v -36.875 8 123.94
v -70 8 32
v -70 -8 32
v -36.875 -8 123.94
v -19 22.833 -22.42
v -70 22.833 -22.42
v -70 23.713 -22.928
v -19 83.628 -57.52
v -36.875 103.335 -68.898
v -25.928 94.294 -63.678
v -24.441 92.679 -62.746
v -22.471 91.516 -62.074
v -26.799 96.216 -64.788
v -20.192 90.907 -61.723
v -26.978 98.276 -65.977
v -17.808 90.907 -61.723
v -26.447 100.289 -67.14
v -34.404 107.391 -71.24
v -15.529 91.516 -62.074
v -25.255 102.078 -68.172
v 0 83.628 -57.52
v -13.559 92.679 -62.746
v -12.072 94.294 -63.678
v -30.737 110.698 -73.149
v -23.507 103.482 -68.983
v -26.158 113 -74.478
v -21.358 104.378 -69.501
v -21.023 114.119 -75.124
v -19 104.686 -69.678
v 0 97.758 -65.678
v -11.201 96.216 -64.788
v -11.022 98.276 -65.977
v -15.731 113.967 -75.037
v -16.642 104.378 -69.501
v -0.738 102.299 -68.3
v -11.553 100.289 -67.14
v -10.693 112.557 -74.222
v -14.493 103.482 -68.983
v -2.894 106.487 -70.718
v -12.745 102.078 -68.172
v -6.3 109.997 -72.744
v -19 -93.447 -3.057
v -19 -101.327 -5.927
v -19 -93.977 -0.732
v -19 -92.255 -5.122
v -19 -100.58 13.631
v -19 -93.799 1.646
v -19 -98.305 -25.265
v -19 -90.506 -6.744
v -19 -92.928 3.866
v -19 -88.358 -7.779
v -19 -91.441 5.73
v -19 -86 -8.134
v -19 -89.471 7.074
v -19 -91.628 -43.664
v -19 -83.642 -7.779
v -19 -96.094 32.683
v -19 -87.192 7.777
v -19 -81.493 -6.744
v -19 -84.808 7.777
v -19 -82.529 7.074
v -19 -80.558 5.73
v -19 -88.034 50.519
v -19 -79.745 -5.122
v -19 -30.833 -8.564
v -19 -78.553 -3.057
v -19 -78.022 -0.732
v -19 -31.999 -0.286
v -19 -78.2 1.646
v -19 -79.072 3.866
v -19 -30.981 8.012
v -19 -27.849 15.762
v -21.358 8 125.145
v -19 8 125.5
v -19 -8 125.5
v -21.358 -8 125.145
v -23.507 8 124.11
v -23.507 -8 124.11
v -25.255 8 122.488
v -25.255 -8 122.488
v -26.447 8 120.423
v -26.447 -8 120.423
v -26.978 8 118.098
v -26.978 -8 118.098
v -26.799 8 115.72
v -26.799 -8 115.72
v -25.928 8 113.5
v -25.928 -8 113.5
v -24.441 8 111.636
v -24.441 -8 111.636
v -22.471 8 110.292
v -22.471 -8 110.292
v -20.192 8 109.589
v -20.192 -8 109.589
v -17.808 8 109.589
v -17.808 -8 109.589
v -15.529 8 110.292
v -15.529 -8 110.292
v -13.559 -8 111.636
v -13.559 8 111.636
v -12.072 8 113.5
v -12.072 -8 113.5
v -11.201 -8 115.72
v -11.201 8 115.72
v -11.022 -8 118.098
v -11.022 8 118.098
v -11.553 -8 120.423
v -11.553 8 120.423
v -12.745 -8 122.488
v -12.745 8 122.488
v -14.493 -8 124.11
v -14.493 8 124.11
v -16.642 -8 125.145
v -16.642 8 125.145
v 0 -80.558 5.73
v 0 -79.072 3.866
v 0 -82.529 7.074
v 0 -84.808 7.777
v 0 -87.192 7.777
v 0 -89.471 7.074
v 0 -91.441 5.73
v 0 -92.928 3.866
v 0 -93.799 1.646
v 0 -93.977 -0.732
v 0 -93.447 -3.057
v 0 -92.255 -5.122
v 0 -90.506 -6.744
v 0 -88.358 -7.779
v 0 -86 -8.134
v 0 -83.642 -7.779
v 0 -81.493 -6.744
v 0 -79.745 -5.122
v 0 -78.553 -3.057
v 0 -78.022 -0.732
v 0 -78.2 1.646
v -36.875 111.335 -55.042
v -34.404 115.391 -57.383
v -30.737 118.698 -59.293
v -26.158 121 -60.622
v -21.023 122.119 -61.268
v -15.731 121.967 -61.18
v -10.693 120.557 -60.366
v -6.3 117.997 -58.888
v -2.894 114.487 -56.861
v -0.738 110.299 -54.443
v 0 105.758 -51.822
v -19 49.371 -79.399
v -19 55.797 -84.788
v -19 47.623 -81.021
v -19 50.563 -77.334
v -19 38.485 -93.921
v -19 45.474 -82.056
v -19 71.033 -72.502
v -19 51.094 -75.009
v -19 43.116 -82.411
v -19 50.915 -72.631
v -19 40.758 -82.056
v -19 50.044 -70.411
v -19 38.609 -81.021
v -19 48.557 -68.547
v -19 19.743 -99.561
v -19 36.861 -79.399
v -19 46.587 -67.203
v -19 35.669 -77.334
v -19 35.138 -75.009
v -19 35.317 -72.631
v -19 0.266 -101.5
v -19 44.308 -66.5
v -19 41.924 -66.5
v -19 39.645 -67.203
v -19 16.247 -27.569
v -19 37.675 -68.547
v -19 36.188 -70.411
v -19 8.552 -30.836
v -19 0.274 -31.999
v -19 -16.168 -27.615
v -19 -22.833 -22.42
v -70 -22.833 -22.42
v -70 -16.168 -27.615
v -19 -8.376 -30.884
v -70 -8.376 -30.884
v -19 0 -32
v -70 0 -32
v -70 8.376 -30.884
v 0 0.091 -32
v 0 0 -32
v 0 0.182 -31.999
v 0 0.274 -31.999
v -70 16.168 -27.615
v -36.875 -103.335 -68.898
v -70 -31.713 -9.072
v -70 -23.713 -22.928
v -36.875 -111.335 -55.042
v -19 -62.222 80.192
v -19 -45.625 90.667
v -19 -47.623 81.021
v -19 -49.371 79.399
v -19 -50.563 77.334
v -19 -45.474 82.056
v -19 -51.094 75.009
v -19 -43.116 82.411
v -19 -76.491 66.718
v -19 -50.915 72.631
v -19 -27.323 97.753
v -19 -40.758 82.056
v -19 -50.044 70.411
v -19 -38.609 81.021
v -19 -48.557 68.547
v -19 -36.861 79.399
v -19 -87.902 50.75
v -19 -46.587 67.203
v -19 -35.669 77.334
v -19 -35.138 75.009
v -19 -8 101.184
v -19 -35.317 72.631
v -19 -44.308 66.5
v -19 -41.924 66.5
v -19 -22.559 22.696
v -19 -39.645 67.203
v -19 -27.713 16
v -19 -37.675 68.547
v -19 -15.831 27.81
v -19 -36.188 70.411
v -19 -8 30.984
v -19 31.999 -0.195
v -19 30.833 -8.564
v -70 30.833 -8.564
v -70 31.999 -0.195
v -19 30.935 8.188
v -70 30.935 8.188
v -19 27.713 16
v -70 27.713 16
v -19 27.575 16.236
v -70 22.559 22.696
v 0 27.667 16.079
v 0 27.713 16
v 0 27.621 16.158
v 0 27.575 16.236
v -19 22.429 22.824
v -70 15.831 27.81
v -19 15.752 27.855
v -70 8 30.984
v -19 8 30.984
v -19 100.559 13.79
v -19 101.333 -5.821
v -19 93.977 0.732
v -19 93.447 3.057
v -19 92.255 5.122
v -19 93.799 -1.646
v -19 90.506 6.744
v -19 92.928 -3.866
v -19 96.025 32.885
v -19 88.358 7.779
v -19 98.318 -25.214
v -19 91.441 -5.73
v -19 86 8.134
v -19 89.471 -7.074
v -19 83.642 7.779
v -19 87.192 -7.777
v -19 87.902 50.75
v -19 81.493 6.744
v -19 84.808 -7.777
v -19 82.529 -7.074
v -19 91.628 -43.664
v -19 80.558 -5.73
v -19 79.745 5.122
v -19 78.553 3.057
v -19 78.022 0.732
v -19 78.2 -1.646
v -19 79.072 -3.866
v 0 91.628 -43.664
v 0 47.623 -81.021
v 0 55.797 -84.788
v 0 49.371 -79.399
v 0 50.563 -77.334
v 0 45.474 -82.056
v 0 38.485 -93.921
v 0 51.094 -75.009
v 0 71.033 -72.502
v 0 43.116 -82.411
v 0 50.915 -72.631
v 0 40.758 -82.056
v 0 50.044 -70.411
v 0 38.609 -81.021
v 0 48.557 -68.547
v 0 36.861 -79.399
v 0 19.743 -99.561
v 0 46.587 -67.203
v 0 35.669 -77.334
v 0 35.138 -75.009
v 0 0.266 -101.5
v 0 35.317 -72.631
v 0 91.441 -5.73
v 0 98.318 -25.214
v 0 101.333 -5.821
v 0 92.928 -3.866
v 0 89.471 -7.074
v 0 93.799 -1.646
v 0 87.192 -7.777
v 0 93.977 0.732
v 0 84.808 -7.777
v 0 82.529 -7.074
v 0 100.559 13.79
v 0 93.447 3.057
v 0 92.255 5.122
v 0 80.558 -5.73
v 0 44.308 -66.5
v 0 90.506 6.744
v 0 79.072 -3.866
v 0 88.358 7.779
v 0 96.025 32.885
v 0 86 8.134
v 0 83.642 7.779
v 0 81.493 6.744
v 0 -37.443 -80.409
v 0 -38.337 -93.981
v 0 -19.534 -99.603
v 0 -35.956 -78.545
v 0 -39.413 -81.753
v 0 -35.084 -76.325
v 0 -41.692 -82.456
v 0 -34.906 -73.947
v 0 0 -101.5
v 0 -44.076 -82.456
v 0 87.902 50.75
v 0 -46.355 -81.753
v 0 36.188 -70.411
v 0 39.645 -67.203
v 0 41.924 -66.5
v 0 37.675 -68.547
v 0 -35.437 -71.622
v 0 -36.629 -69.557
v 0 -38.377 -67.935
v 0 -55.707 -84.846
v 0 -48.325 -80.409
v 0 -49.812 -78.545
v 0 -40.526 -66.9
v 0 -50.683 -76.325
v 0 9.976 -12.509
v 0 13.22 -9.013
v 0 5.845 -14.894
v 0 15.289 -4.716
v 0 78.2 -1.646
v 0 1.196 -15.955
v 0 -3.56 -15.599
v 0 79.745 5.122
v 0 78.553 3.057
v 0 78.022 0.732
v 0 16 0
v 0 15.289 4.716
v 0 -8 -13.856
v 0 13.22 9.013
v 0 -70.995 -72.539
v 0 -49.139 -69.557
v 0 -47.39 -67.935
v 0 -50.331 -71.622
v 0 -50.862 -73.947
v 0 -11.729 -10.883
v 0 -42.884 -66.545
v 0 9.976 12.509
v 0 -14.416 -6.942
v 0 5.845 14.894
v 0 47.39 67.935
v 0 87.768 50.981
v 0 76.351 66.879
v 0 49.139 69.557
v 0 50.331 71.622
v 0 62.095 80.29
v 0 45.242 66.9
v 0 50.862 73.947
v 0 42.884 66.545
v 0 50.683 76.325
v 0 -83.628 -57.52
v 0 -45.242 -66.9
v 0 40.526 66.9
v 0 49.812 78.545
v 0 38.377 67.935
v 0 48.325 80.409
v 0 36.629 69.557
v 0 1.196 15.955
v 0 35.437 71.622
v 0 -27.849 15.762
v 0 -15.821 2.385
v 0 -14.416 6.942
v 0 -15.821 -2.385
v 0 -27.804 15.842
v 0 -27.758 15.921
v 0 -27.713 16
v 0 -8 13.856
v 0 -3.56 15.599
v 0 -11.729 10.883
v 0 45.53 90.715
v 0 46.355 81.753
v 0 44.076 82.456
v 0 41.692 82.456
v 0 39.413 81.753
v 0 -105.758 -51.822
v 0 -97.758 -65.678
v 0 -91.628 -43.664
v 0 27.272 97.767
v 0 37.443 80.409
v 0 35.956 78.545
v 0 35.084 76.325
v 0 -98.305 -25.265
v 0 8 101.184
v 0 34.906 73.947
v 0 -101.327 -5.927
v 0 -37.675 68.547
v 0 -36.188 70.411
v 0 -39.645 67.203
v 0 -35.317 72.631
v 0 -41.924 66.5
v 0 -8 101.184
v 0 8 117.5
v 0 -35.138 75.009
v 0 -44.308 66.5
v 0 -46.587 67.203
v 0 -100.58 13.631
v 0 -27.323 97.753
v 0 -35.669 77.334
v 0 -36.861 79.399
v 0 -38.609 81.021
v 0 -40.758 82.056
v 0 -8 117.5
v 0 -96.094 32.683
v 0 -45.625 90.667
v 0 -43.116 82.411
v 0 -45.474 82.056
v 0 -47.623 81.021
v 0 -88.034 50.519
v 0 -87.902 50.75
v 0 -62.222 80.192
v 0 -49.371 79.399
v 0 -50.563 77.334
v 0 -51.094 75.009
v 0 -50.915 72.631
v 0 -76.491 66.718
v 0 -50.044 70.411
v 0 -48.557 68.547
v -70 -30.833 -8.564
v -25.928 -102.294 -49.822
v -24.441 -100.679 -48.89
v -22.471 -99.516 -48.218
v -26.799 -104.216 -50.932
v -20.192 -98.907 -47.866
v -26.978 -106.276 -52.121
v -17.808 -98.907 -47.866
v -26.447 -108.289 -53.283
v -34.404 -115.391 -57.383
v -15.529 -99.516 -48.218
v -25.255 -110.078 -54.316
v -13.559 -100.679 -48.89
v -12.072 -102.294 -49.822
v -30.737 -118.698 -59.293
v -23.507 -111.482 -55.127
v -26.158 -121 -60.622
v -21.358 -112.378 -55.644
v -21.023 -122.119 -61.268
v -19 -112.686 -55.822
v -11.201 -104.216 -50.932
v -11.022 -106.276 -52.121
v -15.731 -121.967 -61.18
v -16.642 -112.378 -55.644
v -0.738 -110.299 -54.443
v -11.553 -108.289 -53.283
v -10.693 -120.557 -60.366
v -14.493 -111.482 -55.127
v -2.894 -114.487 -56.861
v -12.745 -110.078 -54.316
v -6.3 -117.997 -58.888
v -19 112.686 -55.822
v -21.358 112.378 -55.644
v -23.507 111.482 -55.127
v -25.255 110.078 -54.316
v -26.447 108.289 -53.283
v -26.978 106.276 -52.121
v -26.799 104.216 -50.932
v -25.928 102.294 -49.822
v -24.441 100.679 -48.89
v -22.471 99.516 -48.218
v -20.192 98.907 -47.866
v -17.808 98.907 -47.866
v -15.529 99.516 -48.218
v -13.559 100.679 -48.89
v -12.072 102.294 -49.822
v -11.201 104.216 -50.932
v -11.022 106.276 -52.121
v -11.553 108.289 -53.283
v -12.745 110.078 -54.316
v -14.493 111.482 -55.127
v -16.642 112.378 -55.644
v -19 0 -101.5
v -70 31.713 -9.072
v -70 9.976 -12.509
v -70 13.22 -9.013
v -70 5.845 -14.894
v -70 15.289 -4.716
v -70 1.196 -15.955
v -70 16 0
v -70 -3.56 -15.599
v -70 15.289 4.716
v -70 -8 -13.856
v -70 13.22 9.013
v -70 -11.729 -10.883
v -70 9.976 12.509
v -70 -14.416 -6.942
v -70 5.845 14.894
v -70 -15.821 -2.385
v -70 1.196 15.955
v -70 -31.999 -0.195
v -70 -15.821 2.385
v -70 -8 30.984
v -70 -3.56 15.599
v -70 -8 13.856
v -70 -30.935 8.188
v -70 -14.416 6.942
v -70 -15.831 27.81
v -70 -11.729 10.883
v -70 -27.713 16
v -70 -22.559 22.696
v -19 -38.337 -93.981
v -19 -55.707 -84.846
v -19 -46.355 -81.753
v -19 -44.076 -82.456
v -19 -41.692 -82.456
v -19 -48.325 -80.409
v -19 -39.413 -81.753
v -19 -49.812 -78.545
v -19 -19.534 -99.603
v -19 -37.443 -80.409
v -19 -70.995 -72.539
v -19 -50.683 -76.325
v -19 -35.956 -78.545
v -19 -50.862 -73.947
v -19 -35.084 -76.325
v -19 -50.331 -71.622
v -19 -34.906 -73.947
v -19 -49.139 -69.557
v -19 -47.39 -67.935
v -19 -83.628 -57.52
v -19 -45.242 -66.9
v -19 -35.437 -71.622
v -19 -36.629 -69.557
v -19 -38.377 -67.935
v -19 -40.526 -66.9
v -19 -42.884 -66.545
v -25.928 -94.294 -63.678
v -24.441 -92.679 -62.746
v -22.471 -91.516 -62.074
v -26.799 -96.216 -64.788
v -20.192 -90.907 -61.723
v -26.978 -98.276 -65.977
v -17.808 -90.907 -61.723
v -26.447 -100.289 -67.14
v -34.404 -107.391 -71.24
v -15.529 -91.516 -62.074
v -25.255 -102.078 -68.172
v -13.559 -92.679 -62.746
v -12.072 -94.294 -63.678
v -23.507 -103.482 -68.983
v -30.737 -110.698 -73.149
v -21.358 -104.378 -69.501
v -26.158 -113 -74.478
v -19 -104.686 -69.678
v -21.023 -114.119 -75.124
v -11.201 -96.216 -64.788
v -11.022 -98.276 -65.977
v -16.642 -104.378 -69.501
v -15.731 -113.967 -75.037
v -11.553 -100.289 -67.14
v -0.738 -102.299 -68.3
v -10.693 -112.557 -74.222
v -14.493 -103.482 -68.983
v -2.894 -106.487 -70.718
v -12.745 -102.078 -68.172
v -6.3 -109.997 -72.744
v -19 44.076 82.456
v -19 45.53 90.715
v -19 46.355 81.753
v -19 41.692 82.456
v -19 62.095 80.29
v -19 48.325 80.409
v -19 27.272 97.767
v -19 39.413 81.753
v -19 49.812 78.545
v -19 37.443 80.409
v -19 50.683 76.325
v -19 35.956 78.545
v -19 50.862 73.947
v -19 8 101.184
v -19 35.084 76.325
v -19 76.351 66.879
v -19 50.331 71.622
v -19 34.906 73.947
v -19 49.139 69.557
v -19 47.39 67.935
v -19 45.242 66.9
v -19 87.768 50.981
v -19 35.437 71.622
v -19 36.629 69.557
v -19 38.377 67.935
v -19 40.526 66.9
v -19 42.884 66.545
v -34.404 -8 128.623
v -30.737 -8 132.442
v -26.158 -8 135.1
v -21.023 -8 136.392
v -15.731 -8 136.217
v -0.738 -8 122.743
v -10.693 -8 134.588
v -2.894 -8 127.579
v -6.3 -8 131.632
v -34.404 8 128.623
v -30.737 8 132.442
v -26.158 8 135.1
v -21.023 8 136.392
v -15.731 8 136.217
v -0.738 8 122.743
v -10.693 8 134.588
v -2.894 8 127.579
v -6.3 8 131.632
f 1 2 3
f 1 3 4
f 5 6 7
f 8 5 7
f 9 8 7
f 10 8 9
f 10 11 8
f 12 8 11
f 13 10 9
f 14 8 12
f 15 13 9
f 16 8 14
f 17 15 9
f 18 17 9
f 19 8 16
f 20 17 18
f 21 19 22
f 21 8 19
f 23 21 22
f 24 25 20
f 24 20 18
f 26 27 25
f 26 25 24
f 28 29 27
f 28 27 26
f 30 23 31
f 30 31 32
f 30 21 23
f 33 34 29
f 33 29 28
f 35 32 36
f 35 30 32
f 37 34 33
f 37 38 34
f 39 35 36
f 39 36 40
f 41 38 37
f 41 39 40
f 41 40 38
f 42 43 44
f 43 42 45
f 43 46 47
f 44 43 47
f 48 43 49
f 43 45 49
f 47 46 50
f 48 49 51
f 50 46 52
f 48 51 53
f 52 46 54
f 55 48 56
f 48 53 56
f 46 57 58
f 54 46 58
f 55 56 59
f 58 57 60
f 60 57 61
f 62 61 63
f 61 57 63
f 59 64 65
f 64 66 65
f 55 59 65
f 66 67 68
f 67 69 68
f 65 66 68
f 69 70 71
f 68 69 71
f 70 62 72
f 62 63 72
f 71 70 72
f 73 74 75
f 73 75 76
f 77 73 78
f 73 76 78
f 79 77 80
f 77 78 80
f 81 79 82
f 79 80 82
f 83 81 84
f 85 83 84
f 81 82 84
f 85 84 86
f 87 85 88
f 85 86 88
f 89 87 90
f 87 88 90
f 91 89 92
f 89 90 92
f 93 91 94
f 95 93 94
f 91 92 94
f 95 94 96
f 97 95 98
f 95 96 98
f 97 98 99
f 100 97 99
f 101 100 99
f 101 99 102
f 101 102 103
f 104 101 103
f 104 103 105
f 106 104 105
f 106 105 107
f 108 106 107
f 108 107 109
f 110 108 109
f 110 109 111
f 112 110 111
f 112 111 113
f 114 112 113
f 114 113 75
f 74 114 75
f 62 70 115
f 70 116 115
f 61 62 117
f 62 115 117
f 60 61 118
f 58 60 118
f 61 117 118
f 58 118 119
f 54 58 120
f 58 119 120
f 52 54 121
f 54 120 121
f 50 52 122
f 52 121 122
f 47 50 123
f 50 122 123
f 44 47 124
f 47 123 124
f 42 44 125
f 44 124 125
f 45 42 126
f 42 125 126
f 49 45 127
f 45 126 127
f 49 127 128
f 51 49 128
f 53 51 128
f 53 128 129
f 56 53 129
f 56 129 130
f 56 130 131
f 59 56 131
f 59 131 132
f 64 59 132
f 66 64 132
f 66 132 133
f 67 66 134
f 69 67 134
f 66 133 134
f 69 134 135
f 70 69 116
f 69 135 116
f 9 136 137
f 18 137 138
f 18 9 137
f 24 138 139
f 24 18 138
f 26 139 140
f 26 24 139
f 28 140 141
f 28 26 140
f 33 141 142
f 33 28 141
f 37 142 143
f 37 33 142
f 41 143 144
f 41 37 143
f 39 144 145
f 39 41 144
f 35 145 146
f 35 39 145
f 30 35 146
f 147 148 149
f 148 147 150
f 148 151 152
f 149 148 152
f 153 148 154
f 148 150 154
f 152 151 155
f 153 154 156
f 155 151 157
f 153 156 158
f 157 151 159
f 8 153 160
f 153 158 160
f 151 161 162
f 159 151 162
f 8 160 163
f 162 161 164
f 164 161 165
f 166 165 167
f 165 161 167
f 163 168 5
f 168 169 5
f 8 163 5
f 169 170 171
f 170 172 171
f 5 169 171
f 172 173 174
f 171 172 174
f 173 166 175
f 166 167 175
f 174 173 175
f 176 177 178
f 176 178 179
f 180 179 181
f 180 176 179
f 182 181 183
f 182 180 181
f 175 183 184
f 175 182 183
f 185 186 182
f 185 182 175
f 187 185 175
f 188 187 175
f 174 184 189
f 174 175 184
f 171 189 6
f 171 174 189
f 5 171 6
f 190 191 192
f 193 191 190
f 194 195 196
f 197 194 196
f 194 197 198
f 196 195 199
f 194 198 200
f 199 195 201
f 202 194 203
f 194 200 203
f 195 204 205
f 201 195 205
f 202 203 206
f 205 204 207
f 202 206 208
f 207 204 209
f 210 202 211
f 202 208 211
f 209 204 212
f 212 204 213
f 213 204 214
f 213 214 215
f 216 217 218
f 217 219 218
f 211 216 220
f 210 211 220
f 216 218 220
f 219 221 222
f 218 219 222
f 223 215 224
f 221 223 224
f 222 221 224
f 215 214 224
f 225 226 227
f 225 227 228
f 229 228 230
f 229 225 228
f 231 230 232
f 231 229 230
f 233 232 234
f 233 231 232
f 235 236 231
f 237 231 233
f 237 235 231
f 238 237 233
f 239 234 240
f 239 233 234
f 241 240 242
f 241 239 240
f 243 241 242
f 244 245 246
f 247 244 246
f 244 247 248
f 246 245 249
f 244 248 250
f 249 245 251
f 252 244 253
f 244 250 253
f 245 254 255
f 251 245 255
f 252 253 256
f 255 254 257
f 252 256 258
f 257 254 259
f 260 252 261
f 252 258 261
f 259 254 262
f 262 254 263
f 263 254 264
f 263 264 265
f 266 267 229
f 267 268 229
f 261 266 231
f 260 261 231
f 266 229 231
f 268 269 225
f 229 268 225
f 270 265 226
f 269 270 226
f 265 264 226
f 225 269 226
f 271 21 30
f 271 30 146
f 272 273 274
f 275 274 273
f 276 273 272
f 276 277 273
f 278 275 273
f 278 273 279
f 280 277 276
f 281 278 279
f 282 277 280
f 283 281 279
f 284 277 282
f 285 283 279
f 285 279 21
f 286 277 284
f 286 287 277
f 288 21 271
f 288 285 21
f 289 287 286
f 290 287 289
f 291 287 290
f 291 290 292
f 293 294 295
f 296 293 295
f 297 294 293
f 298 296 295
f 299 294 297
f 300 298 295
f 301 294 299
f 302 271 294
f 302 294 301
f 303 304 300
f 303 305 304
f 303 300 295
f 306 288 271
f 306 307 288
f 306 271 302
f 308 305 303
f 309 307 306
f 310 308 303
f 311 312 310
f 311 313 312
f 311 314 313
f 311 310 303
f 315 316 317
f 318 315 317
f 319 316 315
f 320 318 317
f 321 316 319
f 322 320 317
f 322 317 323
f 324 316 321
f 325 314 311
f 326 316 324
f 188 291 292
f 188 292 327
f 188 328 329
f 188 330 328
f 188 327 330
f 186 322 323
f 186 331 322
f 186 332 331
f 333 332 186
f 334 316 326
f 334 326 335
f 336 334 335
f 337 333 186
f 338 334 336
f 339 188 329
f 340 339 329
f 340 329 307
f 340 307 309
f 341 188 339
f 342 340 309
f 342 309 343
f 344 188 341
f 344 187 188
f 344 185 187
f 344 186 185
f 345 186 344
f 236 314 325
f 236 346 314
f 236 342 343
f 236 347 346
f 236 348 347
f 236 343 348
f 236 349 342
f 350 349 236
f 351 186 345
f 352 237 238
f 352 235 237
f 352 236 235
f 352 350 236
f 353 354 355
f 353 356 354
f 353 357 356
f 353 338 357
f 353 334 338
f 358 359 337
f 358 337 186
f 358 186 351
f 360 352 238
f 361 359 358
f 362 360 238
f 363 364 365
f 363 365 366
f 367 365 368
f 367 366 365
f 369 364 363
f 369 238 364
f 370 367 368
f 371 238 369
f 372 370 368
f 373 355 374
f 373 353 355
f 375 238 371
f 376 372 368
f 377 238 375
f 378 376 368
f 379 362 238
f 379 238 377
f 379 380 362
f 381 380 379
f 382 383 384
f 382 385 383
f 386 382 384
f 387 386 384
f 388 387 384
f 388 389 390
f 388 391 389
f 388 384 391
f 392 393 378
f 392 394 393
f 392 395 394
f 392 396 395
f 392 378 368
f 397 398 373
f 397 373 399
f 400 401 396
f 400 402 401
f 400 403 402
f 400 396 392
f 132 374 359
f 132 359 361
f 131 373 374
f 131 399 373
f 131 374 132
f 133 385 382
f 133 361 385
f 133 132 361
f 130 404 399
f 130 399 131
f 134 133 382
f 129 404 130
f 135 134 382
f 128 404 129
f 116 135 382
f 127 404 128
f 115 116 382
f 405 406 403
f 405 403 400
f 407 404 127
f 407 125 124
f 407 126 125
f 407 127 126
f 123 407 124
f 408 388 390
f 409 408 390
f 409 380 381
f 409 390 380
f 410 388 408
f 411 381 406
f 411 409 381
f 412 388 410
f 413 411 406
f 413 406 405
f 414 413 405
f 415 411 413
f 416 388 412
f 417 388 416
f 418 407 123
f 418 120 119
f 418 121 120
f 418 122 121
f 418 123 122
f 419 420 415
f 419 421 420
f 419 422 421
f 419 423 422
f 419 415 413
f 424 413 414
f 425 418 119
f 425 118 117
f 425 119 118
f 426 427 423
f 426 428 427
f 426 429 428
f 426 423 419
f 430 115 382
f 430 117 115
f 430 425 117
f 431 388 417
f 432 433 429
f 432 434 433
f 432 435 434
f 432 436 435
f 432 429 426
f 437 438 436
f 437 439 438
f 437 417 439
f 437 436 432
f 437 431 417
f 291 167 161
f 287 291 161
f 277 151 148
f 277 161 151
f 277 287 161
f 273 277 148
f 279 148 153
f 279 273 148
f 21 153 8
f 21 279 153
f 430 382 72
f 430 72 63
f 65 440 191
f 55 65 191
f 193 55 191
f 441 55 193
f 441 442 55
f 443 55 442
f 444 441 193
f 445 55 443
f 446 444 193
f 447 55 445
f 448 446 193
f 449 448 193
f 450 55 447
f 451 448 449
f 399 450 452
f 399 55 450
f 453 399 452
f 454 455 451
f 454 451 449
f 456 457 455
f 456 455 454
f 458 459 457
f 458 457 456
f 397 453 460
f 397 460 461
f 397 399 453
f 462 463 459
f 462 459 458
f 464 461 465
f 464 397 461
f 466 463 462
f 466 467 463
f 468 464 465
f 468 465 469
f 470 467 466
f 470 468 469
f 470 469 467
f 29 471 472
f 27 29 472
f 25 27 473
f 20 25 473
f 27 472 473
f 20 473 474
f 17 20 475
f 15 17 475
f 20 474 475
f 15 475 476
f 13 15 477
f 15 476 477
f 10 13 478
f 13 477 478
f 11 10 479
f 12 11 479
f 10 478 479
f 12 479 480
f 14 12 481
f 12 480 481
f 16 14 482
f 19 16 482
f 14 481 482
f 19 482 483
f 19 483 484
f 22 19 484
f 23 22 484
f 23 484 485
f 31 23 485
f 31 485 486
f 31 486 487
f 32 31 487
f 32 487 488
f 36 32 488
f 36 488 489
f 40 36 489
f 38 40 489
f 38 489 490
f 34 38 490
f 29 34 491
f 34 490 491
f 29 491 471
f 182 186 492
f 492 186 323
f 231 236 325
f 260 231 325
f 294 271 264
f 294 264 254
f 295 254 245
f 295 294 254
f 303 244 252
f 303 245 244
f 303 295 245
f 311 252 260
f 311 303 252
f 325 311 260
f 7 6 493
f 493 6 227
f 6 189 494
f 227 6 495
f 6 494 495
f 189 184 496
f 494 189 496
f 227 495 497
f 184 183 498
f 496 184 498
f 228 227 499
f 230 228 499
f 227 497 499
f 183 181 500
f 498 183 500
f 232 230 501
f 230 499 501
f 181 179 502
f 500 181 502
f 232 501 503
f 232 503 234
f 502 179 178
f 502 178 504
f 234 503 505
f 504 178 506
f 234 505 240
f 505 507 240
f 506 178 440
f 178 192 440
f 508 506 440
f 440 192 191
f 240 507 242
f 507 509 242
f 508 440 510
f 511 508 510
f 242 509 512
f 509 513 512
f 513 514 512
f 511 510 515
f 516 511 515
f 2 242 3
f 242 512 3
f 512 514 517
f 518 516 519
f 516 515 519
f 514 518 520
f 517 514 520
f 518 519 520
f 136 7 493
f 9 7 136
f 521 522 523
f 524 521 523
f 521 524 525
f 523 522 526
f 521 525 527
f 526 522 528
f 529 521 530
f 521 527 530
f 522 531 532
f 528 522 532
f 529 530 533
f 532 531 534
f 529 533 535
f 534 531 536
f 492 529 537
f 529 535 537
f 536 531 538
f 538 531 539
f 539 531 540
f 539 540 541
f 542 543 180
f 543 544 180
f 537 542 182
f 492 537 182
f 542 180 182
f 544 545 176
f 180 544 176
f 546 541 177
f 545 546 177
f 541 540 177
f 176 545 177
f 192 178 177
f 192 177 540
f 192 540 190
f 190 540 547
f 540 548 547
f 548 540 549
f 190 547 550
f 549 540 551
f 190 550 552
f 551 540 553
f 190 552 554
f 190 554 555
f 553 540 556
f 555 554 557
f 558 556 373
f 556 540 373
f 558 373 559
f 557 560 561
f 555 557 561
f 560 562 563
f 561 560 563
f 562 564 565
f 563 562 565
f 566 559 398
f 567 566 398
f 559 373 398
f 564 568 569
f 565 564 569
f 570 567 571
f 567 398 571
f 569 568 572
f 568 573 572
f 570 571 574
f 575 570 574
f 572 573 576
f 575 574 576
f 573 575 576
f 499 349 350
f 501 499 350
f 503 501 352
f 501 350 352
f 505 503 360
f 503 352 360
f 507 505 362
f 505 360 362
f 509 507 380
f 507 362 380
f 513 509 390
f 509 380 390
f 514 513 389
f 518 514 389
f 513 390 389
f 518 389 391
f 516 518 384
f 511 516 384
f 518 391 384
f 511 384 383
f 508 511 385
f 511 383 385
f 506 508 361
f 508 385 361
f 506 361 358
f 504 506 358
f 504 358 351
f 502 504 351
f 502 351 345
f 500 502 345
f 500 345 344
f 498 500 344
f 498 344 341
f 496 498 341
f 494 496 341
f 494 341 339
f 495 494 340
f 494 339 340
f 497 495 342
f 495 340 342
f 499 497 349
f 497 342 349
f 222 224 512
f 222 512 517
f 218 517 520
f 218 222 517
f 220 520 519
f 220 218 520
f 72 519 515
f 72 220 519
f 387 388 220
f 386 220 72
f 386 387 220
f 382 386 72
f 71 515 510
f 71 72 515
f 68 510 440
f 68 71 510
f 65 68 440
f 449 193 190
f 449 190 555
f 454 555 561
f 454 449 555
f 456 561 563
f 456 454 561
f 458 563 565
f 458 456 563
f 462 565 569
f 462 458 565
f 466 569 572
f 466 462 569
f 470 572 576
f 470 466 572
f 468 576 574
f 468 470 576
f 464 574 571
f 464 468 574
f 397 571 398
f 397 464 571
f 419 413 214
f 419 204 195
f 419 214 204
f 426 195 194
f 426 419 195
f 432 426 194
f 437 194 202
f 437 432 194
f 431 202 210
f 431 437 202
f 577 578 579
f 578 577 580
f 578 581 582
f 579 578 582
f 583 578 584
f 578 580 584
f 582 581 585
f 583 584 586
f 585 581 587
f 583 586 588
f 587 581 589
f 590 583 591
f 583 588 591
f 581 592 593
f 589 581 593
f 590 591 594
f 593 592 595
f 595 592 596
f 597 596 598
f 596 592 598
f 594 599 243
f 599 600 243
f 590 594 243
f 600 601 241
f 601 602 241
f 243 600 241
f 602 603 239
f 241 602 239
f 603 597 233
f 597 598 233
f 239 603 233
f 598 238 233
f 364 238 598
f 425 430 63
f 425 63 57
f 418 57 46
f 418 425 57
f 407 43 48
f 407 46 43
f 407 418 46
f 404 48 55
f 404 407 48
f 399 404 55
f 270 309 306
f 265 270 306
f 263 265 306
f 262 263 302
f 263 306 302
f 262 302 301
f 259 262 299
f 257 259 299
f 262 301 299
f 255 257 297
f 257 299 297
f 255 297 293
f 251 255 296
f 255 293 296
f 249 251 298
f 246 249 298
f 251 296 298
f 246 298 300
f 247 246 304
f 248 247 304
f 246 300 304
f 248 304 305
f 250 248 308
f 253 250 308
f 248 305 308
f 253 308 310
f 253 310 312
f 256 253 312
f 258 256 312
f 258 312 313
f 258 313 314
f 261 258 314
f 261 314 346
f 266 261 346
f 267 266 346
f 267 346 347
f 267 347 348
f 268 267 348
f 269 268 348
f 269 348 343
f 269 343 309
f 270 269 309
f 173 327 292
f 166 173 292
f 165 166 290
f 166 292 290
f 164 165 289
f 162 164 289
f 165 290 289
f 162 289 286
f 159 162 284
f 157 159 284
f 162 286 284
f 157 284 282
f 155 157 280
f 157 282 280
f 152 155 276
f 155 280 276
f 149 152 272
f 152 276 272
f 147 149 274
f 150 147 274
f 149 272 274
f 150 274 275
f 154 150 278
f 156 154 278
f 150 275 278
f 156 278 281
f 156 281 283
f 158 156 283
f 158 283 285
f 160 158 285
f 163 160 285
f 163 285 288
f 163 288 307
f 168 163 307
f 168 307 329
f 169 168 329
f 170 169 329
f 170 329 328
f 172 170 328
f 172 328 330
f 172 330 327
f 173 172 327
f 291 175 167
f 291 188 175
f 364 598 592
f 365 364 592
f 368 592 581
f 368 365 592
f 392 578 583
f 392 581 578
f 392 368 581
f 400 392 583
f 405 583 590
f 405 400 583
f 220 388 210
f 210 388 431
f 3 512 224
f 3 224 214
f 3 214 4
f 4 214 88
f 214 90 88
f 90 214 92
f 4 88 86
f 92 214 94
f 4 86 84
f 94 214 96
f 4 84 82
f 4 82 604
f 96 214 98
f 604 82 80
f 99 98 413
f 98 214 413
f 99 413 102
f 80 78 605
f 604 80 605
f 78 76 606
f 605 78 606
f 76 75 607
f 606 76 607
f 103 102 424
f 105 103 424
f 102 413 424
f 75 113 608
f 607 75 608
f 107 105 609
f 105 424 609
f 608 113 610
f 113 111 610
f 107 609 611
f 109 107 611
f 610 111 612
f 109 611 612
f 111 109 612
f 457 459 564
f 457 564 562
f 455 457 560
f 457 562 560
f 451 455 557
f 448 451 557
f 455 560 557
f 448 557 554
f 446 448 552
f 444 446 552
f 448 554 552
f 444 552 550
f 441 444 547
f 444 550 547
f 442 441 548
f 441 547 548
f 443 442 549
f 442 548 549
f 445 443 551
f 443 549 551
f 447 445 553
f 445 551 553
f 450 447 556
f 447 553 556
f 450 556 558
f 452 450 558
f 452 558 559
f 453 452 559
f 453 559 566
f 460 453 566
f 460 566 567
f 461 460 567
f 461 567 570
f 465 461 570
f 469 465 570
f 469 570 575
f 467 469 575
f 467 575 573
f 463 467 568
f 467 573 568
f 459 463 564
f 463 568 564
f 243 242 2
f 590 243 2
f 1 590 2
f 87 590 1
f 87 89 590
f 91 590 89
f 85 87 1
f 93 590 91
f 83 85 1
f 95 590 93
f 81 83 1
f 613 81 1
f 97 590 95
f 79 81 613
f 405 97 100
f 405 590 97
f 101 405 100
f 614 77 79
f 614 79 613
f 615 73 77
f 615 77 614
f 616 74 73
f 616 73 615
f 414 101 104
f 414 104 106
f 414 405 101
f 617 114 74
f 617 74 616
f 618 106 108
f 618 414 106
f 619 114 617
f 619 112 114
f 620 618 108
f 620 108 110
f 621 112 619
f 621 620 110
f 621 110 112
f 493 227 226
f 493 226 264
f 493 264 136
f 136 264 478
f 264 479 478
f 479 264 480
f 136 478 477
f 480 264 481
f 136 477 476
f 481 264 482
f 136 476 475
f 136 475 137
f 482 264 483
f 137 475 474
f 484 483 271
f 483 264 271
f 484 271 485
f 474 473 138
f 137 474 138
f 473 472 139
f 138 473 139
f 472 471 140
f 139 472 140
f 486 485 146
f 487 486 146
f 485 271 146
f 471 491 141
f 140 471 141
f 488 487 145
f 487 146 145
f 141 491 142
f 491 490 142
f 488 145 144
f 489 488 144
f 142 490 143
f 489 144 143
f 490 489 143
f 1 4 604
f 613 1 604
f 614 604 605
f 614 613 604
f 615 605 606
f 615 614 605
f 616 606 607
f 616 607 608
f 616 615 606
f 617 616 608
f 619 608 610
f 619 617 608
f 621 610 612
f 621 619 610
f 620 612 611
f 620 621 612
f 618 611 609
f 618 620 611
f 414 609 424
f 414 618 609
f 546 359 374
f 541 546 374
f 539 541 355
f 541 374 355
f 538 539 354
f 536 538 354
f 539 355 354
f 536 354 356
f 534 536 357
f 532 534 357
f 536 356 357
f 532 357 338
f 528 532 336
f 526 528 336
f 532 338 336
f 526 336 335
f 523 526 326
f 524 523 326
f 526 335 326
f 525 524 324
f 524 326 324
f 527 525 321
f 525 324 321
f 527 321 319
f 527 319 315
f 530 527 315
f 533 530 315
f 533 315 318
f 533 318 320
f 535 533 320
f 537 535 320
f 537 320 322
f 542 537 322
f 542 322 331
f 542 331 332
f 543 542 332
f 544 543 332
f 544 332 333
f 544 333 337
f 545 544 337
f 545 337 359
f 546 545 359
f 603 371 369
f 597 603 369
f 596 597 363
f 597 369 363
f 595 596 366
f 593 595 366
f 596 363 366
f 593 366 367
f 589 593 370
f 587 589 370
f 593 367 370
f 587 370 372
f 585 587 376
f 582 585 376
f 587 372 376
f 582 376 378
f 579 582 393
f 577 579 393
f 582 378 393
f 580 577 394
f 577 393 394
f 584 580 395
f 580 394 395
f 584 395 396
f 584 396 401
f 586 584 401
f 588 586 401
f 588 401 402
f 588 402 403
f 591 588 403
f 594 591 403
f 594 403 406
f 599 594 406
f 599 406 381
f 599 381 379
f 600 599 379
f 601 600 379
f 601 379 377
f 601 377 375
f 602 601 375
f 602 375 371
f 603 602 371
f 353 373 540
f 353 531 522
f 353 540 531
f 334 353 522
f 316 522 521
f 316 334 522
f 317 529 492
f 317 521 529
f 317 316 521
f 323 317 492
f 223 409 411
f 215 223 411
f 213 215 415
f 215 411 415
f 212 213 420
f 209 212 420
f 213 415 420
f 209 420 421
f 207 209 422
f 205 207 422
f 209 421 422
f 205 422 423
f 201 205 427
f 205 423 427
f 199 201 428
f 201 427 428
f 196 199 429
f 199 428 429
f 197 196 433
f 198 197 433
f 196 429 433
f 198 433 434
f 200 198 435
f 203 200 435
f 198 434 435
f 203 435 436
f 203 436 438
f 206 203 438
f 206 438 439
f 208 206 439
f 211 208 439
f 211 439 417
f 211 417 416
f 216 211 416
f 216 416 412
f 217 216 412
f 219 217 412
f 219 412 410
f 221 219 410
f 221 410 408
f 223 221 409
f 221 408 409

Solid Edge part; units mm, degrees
sketch "Sketch1" plane through (0, 0, 0) normal (1, 0, 0) x (0, 1, 0)
  circle A0 centre (0, 0) radius 32
  circle A1 centre (0, 0) radius 16
extrude "Protrusion1" add sketch "Sketch1" against normal blind 70
sketch "Sketch2" plane through (0, 0, 0) normal (0, -1, 0) x (1, 0, 0)
  line L0 (-70, 32) -> (-36.8752, 123.9402)
  line L1 (0, 32) -> (0, 117.5)
  line L2 (0, 19.9591) -> (0, 32)
  line L3 (-70, 19.9591) -> (0, 19.9591)
  line L4 (-70, 32) -> (-70, 19.9591)
  arc A0 (-36.8752, 123.9402) -> (0, 117.5) centre (-19, 117.5) cw
extrude "ExtrudedProtrusion_6" add sketch "Sketch2" along normal mid plane 16
pattern_circular "Pattern1" count 3 over 360 about axis through (-70, 0, 0) along (-1, 0, 0) of "ExtrudedProtrusion_6"
sketch "Sketch3" plane through (0, 0, 25.9109) normal (1, 0, 0) x (0, -0.866, 0.5)
  line L0 (-29.1919, 50.0144) -> (-63.936, 110.2076)
  line L1 (-44.9554, 22.4395) -> (-114.4554, 22.4395)
  arc A0 (-114.4554, 22.4395) -> (-63.936, 110.2076) centre (-12.9554, 22.4395) cw
  arc A1 (-44.9554, 22.4395) -> (-29.1919, 50.0144) centre (-12.9554, 22.4395) cw
  circle A2 centre (-87.5005, 65.3234) radius 8
extrude "ExtrudedProtrusion_7" add sketch "Sketch3" against normal blind 19
pattern_circular "Pattern3" count 6 over 360 about axis through (0, 0, 0) along (-1, 0, 0) of "ExtrudedProtrusion_7"
sketch "Sketch4" plane through (-35, 76.5226, -34.9428) normal (0, 0.5, 0.866) x (0, 0.866, -0.5)
  circle A0 centre (33.7581, -16) radius 8
extrude "ExtrudedCutout_3" cut sketch "Sketch4" against normal blind 16
pattern_circular "Pattern4" count 3 over 360 about axis through (0, 0, 0) along (-1, 0, 0) of "ExtrudedCutout_3"
